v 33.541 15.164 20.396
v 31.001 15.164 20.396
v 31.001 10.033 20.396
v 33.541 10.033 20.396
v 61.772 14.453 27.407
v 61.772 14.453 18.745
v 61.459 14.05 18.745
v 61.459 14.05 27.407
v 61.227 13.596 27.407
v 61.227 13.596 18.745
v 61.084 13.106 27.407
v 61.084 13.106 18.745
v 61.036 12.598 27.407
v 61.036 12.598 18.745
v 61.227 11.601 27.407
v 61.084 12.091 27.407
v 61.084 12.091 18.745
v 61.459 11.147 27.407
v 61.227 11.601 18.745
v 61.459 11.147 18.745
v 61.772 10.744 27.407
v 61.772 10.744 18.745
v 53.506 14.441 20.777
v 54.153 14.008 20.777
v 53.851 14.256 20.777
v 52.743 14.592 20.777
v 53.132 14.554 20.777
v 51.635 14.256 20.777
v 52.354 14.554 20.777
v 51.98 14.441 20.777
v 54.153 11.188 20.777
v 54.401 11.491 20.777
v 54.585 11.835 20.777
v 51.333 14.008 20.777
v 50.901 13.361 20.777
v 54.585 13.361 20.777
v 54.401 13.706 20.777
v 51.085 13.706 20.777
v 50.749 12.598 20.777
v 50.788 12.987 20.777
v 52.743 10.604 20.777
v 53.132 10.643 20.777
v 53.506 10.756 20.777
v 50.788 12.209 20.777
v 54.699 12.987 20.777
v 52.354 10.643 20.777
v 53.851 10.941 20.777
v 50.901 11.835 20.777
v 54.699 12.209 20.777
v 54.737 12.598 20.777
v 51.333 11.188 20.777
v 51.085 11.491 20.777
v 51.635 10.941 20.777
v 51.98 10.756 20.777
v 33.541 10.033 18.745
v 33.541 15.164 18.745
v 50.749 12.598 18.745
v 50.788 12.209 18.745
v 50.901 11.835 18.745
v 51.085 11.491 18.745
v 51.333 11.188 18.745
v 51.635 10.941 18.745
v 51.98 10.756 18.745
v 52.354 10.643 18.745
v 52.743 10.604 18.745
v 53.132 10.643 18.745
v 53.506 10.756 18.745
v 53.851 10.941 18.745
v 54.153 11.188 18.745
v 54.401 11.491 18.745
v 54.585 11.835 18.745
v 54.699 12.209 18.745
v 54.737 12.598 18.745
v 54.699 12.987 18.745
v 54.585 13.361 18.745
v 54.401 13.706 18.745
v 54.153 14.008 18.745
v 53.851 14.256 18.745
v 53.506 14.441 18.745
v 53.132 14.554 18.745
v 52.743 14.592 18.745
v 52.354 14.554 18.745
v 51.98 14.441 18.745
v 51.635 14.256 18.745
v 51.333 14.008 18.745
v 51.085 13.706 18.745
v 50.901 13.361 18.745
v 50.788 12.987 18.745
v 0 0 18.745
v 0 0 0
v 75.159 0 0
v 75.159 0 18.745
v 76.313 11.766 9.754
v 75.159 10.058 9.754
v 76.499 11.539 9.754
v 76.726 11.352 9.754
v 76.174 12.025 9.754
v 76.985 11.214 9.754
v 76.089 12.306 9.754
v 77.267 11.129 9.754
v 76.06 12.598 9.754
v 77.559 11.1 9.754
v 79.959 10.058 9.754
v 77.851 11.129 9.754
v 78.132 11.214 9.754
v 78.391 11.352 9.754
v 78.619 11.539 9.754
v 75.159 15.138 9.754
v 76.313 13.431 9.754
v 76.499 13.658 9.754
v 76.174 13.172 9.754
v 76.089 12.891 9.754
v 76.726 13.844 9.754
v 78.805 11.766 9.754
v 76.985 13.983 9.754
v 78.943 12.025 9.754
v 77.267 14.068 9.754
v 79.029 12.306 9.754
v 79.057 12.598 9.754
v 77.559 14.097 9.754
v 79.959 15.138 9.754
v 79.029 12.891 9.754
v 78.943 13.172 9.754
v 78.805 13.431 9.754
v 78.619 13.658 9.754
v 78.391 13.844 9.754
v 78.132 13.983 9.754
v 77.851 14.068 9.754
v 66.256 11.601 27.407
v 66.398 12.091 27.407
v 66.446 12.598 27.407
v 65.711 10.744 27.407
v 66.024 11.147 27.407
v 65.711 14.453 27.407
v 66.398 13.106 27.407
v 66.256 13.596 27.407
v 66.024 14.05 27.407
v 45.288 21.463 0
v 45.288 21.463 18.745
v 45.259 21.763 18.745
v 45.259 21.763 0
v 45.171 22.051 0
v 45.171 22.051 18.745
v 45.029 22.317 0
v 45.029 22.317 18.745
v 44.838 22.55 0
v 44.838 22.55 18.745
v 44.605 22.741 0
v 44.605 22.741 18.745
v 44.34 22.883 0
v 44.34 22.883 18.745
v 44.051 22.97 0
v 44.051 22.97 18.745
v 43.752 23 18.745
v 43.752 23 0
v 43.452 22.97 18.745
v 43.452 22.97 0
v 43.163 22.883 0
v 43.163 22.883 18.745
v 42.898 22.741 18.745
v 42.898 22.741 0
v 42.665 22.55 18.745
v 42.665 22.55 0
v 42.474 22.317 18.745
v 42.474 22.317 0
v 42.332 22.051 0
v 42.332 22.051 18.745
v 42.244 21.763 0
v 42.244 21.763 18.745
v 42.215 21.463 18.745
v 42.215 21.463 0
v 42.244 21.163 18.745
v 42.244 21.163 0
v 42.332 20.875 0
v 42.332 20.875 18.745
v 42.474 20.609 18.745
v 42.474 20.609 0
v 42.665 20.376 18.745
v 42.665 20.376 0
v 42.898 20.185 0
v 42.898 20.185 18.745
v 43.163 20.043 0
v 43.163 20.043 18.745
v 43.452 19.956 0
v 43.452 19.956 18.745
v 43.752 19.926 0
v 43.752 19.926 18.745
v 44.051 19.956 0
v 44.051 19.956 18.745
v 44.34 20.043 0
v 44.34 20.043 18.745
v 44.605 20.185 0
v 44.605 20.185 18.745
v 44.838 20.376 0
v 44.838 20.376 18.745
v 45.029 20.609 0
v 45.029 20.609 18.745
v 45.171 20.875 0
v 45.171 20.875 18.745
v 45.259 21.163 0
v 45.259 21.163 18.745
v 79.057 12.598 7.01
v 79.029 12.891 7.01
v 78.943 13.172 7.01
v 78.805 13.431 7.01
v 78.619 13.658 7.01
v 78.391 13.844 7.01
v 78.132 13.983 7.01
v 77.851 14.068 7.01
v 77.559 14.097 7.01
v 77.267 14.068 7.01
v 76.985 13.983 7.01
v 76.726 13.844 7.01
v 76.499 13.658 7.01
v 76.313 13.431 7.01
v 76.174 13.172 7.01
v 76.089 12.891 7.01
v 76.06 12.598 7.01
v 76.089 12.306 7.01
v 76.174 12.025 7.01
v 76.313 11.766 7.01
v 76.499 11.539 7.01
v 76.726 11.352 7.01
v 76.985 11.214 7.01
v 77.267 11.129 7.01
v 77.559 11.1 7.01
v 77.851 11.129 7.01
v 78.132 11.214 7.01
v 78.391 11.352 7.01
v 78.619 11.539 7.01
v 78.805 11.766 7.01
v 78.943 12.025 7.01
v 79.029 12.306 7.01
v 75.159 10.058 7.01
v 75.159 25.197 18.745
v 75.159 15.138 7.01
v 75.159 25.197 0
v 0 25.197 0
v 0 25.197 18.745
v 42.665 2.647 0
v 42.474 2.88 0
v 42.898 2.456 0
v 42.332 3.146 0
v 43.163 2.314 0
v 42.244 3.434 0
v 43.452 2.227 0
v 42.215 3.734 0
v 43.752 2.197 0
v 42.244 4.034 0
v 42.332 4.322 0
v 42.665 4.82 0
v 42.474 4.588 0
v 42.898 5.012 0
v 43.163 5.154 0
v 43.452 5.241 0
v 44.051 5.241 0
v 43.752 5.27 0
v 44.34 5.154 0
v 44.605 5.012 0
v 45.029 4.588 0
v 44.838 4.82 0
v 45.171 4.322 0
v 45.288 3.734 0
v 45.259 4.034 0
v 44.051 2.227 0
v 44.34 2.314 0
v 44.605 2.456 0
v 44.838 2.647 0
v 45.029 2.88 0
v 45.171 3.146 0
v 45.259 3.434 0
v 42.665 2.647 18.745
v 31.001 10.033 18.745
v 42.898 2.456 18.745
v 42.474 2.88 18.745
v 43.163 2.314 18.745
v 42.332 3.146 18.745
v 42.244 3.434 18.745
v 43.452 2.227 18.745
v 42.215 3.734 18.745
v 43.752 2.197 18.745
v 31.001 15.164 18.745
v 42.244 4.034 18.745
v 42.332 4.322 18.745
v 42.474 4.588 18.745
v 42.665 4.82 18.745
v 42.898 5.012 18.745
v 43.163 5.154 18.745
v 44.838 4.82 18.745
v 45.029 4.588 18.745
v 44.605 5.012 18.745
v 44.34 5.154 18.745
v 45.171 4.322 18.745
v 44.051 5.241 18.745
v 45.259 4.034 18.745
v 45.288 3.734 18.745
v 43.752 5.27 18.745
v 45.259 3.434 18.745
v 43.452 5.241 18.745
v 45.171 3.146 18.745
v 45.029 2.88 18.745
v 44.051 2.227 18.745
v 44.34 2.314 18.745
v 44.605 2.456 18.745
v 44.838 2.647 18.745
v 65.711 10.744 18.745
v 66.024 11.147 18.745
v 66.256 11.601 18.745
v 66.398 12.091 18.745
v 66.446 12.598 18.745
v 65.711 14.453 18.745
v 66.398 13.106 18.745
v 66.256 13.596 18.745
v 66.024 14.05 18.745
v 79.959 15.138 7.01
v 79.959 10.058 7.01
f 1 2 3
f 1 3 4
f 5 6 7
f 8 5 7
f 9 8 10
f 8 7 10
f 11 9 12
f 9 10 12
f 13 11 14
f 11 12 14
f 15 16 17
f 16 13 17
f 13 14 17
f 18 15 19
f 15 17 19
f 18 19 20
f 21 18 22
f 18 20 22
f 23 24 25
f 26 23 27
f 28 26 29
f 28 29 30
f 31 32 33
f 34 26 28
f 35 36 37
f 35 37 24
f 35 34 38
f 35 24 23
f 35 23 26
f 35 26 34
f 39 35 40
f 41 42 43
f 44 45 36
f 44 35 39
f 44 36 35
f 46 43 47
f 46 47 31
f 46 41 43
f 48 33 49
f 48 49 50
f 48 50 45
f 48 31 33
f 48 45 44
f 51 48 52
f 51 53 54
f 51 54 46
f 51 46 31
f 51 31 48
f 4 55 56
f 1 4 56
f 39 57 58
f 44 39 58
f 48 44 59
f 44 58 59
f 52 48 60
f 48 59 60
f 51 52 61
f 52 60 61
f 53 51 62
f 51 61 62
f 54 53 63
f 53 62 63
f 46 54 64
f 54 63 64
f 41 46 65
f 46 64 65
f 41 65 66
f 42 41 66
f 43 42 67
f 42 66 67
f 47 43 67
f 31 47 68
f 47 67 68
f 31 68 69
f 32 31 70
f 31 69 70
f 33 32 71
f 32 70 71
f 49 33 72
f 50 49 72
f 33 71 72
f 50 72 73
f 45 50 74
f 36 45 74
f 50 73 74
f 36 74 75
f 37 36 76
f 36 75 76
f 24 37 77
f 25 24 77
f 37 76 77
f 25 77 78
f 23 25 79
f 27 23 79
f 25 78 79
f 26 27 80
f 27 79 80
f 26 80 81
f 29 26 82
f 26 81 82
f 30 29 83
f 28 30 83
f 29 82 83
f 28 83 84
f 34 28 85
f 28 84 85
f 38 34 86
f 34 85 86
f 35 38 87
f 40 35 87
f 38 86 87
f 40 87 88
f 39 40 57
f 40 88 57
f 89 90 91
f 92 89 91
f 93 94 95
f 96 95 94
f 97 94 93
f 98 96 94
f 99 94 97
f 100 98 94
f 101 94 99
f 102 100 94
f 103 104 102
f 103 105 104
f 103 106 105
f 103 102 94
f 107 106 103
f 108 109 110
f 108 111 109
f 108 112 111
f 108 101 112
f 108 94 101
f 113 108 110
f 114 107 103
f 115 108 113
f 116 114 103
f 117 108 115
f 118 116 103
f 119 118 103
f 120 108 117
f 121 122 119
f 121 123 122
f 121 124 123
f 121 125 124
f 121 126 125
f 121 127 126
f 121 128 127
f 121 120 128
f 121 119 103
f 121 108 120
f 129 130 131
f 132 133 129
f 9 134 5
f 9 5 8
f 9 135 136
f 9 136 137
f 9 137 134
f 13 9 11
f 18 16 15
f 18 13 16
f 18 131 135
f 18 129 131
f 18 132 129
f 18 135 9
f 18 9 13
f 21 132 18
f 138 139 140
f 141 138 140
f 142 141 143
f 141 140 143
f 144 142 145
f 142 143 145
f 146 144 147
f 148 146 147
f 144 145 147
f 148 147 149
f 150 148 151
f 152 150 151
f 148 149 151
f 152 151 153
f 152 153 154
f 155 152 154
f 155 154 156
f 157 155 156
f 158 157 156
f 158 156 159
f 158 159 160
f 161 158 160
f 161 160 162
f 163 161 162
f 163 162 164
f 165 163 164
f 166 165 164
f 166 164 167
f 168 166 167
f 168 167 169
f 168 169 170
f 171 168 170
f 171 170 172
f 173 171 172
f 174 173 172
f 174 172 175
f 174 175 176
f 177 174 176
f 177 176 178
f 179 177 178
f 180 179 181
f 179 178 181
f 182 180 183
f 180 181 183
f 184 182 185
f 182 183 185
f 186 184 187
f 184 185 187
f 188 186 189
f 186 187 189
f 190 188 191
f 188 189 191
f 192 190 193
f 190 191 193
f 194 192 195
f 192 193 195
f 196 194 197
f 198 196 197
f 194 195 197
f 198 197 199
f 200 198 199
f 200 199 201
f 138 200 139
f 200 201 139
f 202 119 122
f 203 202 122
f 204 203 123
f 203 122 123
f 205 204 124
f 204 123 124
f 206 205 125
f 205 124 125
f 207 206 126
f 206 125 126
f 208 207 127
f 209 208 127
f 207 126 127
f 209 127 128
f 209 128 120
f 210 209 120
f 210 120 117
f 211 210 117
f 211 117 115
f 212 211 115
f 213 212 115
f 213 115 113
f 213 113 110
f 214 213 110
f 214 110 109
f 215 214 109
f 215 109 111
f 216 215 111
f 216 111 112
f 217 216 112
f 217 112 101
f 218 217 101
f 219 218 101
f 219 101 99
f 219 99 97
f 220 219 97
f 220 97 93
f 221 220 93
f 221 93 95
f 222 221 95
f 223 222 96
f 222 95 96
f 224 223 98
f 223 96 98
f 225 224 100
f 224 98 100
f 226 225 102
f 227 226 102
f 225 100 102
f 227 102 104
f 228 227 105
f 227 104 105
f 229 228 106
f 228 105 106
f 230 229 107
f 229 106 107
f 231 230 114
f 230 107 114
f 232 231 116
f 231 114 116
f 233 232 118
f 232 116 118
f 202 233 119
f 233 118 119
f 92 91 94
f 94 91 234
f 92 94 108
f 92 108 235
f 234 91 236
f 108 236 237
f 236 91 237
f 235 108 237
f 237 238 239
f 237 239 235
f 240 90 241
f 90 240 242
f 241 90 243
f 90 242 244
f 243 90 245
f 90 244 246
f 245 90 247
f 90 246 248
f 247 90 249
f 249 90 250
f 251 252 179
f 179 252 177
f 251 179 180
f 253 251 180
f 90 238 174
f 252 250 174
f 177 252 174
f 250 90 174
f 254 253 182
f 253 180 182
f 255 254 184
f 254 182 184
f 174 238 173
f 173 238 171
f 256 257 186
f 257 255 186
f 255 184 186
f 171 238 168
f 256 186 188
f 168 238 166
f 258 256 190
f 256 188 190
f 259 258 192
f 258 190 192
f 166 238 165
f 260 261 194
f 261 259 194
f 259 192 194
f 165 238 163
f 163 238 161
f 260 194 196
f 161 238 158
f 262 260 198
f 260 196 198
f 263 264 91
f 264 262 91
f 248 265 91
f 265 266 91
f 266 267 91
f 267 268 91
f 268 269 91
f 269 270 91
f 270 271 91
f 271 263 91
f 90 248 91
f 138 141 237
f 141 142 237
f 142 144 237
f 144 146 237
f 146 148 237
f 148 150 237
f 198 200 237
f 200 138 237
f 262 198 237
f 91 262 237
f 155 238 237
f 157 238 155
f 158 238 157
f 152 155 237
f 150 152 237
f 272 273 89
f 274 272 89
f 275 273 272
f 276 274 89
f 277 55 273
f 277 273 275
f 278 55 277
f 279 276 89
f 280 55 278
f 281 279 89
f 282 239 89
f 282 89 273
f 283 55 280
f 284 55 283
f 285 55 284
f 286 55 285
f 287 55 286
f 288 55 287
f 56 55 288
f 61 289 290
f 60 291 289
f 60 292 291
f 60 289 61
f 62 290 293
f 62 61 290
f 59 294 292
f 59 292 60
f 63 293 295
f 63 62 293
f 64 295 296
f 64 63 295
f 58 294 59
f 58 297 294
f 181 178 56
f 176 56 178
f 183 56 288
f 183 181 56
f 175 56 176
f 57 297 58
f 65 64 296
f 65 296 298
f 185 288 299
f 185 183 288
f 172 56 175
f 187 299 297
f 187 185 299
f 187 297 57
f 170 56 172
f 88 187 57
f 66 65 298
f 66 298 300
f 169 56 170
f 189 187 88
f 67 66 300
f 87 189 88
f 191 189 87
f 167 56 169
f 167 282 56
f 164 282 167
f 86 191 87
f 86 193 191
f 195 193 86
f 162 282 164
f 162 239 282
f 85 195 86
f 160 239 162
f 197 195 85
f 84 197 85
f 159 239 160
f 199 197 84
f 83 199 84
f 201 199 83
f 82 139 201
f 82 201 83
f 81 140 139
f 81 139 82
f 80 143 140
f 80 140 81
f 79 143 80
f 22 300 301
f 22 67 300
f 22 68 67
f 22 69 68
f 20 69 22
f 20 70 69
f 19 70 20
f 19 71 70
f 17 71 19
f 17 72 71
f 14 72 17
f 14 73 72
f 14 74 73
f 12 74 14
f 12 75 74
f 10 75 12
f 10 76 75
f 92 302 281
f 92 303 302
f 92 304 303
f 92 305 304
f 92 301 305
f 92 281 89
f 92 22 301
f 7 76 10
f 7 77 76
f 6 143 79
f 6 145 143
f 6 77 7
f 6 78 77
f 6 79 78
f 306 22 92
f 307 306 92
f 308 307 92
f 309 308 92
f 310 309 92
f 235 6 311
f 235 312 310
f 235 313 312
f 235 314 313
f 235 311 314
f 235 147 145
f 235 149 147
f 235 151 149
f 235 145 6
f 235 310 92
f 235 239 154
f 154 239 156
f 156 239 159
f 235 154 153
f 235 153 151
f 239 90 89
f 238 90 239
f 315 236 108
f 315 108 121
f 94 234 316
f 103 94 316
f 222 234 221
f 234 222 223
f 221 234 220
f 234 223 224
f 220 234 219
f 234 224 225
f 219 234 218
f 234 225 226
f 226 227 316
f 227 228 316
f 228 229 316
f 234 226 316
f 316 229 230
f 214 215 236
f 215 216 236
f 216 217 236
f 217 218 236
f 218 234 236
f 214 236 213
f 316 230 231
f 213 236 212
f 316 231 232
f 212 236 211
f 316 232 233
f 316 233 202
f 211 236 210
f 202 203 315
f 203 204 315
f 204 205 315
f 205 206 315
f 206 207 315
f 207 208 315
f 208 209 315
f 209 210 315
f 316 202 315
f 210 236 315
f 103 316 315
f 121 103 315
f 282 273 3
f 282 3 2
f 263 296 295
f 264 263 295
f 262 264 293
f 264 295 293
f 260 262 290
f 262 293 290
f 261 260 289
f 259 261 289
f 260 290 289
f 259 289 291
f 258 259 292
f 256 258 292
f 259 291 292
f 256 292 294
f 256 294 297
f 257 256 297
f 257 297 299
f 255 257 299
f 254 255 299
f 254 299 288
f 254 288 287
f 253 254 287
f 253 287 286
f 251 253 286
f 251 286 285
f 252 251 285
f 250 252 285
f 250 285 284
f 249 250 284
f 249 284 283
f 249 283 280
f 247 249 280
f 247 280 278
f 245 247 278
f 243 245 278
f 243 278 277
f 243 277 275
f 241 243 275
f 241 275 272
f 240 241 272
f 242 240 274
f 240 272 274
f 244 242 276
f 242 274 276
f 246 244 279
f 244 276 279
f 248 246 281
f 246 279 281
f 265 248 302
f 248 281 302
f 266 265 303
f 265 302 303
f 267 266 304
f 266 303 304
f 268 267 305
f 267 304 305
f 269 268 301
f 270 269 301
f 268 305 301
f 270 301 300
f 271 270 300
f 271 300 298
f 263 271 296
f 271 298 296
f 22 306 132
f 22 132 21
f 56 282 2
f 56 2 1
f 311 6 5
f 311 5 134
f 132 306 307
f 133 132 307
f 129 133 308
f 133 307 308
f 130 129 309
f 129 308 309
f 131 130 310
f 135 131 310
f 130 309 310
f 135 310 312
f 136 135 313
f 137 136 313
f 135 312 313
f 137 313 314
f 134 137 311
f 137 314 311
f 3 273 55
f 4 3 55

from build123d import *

# Parameters (mm, degrees)
SKETCH1_W           = 75.1586
SKETCH1_H           = 25.1968
BOSS_EXTRUDE1_DEPTH = 18.7452
SKETCH2_W           = 4.8006
SKETCH2_H           = 5.08
BOSS_EXTRUDE2_DEPTH = 2.7432
SKETCH4_R           = 1.4986
CUT_EXTRUDE1_DEPTH  = 85.400741157
SKETCH3_R           = 1.9939
BOSS_EXTRUDE3_DEPTH = 2.032
SKETCH5_R           = 2.7051
BOSS_EXTRUDE4_DEPTH = 8.6614
CUT_EXTRUDE2_START  = -8.6614
CUT_EXTRUDE2_DEPTH  = 8.6614
SKETCH7_R           = 1.5367
CUT_EXTRUDE3_DEPTH  = 86.905383521
SKETCH8_W           = 2.54
SKETCH8_H           = 5.1308
BOSS_EXTRUDE5_DEPTH = 1.651


with BuildPart() as part:
    # Sketch1 → Boss-Extrude1 (new body)
    with BuildSketch(Plane.XY):
        with Locations((37.5793, 12.5984)):
            Rectangle(SKETCH1_W, SKETCH1_H)
    extrude(amount=BOSS_EXTRUDE1_DEPTH)

    # Sketch2 → Boss-Extrude2 (add)
    with BuildSketch(Plane.XY.offset(7.0104)):
        with Locations((77.5589, 12.5984)):
            Rectangle(SKETCH2_W, SKETCH2_H)
    extrude(amount=BOSS_EXTRUDE2_DEPTH)

    # Sketch4 → Cut-Extrude1 (cut, through all)
    with BuildSketch(Plane.XY.offset(9.7536)):
        with Locations((77.5589, 12.5984)):
            Circle(SKETCH4_R)
    extrude(amount=-CUT_EXTRUDE1_DEPTH, mode=Mode.SUBTRACT)

    # Sketch3 → Boss-Extrude3 (add)
    with BuildSketch(Plane.XY.offset(18.7452)):
        with Locations(Location((52.7431, 12.5984, 0), (0, 0, 180))):
            Circle(SKETCH3_R)
    extrude(amount=BOSS_EXTRUDE3_DEPTH)

    # Sketch5 → Boss-Extrude4 (add)
    with BuildSketch(Plane.XY.offset(18.7452)):
        with Locations(Location((63.7413, 12.5984, 0), (0, 0, 180))):
            Circle(SKETCH5_R)
    extrude(amount=BOSS_EXTRUDE4_DEPTH)

    # Sketch6 → Cut-Extrude2 (cut)
    with BuildSketch(Plane.XY.offset(27.4066).offset(CUT_EXTRUDE2_START)):
        with BuildLine():
            ThreePointArc((65.710946763, 14.4526), (63.7413, 15.3035), (61.771653237, 14.4526))
            Line((61.771653237, 14.4526), (65.710946763, 14.4526))
        make_face()
        with BuildLine():
            Line((65.710946763, 10.7442), (61.771653237, 10.7442))
            ThreePointArc((61.771653237, 10.7442), (63.7413, 9.8933), (65.710946763, 10.7442))
        make_face()
    extrude(amount=CUT_EXTRUDE2_DEPTH, mode=Mode.SUBTRACT)

    # Sketch7 → Cut-Extrude3 (cut, through all)
    with BuildSketch(Plane.XY.offset(18.7452)):
        with Locations((43.7515, 21.463)):
            Circle(SKETCH7_R)
        with Locations((43.7515, 3.7338)):
            Circle(SKETCH7_R)
    extrude(amount=-CUT_EXTRUDE3_DEPTH, mode=Mode.SUBTRACT)

    # Sketch8 → Boss-Extrude5 (add)
    with BuildSketch(Plane.XY.offset(18.7452)):
        with Locations((32.2707, 12.5984)):
            Rectangle(SKETCH8_W, SKETCH8_H)
    extrude(amount=BOSS_EXTRUDE5_DEPTH)


solid = part.part
